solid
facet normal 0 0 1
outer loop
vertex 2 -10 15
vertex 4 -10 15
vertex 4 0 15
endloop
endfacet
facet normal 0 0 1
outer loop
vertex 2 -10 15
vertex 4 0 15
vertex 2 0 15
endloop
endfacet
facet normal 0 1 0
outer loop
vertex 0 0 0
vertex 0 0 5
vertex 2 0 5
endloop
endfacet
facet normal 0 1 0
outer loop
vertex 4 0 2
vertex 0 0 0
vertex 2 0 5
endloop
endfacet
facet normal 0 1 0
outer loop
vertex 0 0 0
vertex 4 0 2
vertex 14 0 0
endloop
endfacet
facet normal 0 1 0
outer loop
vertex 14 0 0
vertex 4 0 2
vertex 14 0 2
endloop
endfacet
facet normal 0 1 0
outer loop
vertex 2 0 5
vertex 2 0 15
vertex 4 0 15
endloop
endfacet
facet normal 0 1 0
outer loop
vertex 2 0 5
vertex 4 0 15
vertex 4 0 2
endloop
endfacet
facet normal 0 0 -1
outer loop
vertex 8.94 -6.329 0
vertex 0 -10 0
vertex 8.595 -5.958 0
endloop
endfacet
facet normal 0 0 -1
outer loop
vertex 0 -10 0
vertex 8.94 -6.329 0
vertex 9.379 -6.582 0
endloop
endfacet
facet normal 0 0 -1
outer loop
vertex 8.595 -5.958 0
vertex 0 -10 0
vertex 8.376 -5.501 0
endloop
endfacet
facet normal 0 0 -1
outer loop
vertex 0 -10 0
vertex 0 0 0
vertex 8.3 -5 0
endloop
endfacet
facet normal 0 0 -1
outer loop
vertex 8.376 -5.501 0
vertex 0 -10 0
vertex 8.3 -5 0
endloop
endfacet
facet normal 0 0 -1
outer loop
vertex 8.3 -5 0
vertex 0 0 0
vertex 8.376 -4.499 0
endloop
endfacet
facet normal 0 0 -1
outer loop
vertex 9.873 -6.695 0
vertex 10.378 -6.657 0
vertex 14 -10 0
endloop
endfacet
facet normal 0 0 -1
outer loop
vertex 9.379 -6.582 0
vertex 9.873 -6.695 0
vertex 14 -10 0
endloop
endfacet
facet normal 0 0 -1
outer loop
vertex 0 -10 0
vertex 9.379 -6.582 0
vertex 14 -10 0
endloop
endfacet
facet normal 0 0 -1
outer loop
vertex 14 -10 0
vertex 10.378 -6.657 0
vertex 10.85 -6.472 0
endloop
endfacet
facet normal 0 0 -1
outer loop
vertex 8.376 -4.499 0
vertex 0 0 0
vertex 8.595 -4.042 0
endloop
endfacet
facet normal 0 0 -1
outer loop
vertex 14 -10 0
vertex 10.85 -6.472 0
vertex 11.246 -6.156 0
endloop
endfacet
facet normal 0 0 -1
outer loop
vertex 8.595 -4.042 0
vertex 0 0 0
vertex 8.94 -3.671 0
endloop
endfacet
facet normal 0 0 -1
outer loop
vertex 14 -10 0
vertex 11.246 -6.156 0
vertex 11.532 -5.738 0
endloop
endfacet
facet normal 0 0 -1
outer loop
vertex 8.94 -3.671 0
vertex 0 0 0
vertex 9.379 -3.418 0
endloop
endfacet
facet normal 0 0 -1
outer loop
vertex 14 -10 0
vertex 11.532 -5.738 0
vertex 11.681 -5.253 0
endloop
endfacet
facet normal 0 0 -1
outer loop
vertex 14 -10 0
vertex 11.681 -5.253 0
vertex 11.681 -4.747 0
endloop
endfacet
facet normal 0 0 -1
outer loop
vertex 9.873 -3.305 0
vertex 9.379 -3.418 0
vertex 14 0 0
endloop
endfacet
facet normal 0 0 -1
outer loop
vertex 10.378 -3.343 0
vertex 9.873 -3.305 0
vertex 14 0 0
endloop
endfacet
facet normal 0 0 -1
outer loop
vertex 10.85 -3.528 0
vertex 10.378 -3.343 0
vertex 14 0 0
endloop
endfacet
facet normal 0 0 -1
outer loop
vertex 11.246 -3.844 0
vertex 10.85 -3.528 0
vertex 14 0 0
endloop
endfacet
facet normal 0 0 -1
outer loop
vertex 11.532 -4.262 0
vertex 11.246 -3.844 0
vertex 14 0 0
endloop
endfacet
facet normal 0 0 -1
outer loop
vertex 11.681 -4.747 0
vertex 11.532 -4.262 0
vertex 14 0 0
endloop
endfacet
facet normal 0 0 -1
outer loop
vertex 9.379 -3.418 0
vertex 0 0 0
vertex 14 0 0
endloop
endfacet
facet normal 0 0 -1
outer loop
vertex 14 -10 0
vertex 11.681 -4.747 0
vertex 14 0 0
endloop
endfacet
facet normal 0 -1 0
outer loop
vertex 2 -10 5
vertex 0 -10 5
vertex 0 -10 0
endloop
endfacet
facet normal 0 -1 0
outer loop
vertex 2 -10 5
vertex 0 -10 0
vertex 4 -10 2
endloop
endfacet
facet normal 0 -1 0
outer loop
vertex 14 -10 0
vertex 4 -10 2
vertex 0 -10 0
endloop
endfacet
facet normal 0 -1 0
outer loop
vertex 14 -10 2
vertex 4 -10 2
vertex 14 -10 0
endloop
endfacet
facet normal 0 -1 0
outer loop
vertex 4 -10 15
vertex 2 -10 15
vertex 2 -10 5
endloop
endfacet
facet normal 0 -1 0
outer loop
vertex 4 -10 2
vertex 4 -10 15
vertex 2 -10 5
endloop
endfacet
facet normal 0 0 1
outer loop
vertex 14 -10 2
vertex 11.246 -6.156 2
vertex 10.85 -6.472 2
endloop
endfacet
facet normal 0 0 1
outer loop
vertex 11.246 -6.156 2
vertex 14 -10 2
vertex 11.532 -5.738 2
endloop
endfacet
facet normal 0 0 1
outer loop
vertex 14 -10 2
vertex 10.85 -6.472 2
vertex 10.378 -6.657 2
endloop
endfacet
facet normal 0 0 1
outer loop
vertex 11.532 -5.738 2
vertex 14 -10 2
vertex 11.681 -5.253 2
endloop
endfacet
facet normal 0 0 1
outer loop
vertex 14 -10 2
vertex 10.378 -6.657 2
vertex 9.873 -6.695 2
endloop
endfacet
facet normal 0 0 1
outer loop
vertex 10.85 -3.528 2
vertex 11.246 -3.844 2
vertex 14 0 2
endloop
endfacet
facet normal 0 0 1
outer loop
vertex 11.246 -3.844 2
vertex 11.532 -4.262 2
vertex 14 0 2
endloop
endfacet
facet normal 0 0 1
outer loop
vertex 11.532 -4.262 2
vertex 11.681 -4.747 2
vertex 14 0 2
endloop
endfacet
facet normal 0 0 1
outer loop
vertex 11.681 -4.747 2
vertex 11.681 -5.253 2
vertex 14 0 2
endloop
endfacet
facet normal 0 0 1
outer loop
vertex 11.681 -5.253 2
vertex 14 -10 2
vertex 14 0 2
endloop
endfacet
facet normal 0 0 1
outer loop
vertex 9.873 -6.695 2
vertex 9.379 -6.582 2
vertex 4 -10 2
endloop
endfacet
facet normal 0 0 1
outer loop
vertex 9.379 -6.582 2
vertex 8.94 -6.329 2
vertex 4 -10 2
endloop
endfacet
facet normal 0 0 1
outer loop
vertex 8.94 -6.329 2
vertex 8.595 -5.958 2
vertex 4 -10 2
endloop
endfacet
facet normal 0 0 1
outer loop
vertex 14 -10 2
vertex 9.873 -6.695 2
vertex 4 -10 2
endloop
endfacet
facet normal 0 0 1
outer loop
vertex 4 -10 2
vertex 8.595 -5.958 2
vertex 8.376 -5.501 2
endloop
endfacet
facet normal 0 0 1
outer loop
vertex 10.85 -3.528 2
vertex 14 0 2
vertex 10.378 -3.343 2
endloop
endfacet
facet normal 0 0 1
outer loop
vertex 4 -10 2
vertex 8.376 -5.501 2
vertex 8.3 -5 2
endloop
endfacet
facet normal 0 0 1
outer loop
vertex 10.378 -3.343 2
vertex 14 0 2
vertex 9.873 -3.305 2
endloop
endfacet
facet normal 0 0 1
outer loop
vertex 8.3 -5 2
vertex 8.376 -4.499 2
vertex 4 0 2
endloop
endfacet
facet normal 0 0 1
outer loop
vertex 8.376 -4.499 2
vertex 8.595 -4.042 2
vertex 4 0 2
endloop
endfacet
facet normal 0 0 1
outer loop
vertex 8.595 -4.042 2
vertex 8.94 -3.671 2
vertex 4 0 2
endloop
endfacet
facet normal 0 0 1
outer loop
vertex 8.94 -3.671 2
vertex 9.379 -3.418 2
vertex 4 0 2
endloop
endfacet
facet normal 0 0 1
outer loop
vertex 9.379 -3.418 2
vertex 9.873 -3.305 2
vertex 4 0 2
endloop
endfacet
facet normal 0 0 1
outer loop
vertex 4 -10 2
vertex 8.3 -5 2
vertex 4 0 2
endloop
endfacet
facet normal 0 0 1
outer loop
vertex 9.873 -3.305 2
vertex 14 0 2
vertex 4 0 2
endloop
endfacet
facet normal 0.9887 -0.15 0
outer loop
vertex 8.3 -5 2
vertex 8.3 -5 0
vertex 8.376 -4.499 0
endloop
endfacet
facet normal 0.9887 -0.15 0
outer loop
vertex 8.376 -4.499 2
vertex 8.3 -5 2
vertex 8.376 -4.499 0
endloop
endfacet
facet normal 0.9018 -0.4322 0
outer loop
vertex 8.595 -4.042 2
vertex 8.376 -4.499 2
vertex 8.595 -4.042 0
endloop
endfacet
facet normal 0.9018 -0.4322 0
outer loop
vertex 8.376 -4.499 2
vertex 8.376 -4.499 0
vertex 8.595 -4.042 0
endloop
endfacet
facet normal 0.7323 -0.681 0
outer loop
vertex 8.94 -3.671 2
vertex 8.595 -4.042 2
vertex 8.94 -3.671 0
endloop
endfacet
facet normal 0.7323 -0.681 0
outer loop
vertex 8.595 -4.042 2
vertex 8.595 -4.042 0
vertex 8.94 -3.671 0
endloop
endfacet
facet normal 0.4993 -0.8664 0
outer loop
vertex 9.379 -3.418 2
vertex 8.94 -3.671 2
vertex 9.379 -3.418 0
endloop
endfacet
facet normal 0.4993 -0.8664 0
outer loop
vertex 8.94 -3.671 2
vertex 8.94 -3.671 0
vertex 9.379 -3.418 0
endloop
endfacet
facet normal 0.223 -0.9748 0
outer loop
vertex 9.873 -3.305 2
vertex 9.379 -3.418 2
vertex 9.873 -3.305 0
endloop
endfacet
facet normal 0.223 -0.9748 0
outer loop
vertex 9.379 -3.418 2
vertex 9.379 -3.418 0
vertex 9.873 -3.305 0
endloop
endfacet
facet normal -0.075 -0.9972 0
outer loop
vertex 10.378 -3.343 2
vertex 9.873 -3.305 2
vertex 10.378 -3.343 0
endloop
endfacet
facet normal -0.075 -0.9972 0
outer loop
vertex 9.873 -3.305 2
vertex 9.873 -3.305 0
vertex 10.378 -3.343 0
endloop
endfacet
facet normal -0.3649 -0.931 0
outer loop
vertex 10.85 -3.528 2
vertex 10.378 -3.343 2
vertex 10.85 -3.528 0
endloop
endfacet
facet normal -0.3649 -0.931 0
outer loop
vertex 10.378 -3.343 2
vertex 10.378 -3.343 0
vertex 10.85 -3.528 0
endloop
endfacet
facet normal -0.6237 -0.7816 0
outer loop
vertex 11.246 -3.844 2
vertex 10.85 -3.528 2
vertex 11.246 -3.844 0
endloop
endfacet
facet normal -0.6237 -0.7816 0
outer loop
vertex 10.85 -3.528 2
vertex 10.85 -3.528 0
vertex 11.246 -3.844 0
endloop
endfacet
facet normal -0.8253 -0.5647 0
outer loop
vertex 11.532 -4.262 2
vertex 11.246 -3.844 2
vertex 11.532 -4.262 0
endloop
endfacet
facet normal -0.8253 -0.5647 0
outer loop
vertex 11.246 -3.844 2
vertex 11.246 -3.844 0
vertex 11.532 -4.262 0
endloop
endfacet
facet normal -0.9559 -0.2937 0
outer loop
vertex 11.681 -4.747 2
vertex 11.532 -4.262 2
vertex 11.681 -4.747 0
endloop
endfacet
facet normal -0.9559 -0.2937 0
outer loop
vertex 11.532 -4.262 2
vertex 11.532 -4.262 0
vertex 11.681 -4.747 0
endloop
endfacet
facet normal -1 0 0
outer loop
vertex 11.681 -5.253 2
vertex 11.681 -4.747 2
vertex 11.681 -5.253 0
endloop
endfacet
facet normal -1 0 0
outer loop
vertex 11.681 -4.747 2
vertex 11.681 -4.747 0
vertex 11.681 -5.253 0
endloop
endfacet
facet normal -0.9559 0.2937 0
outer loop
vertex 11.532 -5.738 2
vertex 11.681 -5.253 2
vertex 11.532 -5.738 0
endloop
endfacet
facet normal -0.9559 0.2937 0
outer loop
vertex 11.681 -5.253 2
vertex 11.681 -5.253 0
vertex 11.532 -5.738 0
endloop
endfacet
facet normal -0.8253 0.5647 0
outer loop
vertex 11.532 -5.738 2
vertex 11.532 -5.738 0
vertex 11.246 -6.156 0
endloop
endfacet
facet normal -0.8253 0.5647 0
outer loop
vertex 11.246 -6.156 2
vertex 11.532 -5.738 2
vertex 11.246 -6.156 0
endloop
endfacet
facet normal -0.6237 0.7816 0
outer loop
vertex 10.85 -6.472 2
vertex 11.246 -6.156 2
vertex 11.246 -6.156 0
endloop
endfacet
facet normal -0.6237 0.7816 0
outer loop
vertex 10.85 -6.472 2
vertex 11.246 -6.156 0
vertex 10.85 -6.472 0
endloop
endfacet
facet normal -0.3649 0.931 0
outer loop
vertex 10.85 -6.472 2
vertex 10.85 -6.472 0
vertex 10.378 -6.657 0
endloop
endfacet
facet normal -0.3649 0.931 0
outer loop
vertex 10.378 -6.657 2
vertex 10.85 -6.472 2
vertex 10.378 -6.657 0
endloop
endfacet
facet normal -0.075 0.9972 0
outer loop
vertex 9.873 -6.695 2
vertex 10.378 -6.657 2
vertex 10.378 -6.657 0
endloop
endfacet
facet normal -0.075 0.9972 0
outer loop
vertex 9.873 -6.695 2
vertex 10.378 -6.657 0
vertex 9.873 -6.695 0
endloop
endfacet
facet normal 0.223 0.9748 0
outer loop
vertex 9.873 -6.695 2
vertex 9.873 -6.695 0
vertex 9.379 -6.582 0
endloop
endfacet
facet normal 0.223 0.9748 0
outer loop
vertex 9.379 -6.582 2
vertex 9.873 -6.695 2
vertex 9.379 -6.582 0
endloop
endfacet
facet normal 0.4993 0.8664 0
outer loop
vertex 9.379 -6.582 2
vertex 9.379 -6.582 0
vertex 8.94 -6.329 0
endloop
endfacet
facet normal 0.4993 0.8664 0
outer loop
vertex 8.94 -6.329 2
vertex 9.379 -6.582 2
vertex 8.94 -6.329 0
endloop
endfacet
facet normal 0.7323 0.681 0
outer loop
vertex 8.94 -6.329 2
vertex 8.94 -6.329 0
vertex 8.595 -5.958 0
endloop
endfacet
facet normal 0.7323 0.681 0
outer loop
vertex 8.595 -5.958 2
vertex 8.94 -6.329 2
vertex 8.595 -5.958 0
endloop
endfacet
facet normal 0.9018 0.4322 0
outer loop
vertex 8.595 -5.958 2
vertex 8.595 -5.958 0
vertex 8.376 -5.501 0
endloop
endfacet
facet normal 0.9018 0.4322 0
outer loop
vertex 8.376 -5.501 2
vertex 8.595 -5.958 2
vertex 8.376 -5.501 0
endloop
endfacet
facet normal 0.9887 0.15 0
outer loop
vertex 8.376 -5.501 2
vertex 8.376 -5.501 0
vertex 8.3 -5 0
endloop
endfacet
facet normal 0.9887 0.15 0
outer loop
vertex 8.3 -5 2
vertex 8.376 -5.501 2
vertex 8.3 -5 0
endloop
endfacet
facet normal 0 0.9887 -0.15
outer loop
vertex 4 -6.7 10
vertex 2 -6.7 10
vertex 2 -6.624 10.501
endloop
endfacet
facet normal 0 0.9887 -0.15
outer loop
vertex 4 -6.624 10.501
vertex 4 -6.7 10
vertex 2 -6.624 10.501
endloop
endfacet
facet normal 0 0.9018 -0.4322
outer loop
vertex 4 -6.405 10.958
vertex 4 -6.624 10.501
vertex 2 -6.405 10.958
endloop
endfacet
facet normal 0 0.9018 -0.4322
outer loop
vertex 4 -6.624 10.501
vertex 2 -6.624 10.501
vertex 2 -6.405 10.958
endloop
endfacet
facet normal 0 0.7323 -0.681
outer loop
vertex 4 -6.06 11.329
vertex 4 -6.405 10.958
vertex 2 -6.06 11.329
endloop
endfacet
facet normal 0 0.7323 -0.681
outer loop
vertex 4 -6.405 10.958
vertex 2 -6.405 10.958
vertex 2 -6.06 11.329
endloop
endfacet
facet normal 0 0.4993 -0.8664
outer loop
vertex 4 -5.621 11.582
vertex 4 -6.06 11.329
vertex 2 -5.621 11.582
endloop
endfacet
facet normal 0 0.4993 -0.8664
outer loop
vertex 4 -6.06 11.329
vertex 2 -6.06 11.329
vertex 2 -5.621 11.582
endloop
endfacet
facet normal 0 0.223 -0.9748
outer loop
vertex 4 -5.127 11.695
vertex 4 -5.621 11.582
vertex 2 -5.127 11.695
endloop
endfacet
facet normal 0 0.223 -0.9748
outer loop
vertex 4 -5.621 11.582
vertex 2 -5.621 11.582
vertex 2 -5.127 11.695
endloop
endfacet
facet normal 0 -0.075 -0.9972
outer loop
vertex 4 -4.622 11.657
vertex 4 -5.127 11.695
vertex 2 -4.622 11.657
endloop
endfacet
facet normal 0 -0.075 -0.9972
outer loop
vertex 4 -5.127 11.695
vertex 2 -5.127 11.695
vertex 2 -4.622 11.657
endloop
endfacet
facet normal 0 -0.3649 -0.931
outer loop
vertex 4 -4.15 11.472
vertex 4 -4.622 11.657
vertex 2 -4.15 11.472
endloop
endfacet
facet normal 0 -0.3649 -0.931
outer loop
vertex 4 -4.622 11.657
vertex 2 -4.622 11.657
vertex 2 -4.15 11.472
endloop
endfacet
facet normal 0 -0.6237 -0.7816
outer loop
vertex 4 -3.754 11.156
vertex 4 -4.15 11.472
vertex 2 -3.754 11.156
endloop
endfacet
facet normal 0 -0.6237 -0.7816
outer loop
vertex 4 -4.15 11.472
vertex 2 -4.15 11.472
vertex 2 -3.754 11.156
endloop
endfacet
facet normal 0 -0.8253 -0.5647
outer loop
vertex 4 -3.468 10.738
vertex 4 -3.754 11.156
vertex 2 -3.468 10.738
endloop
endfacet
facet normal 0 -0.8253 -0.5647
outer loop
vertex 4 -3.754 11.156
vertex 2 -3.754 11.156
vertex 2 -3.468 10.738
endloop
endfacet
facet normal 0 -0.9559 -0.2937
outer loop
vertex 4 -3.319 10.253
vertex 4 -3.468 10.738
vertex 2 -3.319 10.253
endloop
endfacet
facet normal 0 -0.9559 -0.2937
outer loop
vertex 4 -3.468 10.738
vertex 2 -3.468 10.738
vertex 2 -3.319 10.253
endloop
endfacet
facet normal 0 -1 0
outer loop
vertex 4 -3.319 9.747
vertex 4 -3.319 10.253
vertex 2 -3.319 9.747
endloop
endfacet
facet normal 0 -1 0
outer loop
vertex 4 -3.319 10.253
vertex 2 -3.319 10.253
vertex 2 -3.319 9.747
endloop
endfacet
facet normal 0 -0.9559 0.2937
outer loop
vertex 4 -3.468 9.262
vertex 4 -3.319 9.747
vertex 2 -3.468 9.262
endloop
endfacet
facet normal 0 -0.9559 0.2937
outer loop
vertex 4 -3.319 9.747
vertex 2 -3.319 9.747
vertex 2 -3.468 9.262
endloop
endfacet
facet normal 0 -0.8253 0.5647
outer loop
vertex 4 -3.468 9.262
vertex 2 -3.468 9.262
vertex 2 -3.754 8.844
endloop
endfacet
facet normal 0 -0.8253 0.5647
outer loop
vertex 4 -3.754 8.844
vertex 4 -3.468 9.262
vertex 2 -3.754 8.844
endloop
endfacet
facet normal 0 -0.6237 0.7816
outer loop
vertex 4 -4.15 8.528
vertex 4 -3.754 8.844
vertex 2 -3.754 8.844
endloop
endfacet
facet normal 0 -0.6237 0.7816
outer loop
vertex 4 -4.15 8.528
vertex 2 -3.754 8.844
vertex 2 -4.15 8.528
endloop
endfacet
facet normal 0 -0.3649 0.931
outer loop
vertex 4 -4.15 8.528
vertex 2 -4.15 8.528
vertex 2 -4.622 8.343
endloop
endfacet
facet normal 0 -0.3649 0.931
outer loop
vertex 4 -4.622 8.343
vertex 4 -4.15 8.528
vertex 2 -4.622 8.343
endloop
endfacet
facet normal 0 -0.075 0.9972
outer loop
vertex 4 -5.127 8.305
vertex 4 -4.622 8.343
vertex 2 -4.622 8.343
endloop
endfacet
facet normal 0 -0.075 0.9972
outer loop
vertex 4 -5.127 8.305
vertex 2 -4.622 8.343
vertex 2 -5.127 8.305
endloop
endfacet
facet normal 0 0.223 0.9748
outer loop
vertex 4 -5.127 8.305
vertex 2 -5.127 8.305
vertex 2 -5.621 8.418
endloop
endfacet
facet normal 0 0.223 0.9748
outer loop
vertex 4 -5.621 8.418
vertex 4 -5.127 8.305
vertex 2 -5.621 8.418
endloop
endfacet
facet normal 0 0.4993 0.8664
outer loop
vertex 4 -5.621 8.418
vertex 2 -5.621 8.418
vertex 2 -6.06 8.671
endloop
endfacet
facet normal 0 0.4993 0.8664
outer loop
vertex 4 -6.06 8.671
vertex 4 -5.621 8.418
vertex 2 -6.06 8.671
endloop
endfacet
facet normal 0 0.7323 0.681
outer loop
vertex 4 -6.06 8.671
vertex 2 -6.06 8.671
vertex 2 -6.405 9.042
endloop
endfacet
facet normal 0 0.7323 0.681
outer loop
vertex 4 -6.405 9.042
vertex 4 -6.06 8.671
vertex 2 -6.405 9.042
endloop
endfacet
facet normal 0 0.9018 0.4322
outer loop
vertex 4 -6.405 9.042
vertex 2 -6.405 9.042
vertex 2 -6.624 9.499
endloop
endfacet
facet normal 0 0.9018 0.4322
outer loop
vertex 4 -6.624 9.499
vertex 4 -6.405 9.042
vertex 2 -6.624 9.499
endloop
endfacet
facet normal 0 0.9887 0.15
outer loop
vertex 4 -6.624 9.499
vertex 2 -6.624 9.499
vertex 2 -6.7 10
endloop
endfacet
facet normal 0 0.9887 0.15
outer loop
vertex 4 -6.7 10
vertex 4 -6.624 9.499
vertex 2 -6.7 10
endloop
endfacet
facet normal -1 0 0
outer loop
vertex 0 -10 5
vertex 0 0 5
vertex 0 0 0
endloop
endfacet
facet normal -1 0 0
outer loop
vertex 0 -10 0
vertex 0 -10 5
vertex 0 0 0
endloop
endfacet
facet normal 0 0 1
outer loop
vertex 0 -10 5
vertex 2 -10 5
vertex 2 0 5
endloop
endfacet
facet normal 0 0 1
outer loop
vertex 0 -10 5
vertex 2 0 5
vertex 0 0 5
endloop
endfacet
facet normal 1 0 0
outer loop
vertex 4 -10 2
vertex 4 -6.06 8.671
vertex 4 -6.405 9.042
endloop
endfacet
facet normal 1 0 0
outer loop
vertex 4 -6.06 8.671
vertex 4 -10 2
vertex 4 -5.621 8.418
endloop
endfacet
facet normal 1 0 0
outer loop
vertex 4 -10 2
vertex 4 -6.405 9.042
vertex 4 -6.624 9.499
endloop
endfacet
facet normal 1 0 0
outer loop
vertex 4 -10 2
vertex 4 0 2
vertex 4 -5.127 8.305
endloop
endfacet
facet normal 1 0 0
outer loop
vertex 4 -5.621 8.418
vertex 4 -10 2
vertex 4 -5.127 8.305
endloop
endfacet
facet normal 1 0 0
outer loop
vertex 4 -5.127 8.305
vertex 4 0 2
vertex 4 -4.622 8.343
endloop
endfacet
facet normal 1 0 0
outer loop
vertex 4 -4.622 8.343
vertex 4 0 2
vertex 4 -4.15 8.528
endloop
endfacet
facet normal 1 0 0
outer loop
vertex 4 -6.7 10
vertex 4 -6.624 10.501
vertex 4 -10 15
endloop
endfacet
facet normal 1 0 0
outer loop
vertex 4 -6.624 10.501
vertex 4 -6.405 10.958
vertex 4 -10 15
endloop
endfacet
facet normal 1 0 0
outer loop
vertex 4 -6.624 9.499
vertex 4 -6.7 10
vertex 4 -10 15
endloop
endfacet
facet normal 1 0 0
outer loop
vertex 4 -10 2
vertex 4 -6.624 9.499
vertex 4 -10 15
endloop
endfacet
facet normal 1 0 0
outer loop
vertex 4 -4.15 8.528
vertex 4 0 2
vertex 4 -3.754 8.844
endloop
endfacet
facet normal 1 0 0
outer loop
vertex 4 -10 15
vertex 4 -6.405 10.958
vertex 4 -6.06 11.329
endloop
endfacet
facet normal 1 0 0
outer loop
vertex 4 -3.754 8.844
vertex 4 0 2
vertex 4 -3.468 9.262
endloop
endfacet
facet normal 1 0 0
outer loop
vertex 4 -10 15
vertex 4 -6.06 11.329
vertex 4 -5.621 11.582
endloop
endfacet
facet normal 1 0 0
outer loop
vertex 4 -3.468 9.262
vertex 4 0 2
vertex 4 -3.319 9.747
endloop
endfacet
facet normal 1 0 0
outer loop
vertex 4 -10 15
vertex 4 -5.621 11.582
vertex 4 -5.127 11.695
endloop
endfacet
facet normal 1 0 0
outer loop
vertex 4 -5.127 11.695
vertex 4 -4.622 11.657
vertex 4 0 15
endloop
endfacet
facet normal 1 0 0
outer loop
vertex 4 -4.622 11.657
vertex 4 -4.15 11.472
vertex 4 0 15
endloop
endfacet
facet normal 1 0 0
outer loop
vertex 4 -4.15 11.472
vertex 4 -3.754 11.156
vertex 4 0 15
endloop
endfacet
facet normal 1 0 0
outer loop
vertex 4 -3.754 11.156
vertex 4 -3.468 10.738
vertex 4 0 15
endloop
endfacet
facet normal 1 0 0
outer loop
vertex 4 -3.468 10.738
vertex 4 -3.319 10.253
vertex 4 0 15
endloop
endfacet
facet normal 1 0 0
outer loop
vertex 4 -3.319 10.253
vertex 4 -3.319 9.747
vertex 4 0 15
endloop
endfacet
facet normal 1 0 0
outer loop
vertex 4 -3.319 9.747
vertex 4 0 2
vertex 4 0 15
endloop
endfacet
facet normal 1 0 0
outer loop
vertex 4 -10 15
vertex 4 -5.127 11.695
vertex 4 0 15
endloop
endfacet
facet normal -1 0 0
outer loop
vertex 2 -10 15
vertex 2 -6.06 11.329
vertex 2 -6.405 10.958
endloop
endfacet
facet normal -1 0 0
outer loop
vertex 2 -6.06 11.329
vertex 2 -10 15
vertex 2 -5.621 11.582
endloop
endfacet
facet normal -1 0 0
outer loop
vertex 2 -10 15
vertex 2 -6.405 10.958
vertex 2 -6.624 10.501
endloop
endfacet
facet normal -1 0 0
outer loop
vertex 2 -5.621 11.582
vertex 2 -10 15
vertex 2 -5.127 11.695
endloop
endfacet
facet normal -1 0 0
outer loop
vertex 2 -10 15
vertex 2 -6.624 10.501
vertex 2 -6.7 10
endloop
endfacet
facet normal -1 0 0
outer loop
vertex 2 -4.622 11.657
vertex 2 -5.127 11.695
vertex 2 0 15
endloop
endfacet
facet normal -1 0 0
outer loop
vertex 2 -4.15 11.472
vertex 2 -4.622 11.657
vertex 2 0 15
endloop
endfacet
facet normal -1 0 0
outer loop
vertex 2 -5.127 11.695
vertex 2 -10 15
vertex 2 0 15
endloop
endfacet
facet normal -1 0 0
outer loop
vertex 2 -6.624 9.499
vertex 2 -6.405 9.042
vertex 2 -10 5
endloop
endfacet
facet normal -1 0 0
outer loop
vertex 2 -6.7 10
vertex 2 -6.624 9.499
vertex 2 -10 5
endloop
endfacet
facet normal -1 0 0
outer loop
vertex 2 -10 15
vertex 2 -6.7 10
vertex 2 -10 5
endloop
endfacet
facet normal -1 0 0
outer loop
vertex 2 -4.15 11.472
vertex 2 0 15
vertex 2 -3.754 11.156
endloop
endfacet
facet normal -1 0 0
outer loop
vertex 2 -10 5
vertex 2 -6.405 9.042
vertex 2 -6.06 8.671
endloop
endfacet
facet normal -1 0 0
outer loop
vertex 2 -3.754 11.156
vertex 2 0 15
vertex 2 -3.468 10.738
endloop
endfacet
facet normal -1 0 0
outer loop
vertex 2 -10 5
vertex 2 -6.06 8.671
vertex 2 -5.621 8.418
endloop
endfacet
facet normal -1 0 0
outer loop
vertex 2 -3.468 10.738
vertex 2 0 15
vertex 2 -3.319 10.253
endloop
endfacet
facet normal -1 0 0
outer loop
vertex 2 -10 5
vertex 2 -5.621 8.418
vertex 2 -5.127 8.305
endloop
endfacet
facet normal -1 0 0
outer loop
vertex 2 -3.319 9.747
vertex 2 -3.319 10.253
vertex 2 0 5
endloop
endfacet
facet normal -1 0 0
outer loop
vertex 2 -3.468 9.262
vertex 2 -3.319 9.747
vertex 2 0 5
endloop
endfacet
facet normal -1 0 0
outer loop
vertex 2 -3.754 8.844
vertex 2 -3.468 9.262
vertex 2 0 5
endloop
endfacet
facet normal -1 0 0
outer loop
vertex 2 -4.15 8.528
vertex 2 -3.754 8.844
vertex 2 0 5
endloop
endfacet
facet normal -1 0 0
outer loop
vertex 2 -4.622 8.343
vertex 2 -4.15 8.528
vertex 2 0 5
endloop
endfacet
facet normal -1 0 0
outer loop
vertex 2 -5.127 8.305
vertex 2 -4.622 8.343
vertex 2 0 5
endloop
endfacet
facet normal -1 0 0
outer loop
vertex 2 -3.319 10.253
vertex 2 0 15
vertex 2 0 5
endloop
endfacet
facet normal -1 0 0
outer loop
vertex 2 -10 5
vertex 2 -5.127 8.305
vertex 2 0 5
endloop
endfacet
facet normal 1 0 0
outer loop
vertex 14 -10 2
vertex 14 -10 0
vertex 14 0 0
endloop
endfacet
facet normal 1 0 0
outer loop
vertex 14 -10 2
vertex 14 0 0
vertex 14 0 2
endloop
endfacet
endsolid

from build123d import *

# Parameters (mm, degrees)
F1_DEPTH = 10
F3_D     = 3.4
F5_D     = 3.4


with BuildPart() as f1:
    # F0 (on Front) → F1 (new body)
    with BuildSketch(Plane.XZ):
        Polygon((0, 5), (0, 0), (14, 0), (14, 2), (4, 2), (4, 15), (2, 15), (2, 5), align=None)
    extrude(amount=F1_DEPTH)

    # F3 (through all)
    with Locations(Plane.YZ.offset(4)):
        with Locations((-5, 10)):
            Hole(F3_D / 2)

    # F5 (through all)
    with Locations(Plane.XY.offset(2)):
        with Locations((10, -5)):
            Hole(F5_D / 2)


solid = f1.part
